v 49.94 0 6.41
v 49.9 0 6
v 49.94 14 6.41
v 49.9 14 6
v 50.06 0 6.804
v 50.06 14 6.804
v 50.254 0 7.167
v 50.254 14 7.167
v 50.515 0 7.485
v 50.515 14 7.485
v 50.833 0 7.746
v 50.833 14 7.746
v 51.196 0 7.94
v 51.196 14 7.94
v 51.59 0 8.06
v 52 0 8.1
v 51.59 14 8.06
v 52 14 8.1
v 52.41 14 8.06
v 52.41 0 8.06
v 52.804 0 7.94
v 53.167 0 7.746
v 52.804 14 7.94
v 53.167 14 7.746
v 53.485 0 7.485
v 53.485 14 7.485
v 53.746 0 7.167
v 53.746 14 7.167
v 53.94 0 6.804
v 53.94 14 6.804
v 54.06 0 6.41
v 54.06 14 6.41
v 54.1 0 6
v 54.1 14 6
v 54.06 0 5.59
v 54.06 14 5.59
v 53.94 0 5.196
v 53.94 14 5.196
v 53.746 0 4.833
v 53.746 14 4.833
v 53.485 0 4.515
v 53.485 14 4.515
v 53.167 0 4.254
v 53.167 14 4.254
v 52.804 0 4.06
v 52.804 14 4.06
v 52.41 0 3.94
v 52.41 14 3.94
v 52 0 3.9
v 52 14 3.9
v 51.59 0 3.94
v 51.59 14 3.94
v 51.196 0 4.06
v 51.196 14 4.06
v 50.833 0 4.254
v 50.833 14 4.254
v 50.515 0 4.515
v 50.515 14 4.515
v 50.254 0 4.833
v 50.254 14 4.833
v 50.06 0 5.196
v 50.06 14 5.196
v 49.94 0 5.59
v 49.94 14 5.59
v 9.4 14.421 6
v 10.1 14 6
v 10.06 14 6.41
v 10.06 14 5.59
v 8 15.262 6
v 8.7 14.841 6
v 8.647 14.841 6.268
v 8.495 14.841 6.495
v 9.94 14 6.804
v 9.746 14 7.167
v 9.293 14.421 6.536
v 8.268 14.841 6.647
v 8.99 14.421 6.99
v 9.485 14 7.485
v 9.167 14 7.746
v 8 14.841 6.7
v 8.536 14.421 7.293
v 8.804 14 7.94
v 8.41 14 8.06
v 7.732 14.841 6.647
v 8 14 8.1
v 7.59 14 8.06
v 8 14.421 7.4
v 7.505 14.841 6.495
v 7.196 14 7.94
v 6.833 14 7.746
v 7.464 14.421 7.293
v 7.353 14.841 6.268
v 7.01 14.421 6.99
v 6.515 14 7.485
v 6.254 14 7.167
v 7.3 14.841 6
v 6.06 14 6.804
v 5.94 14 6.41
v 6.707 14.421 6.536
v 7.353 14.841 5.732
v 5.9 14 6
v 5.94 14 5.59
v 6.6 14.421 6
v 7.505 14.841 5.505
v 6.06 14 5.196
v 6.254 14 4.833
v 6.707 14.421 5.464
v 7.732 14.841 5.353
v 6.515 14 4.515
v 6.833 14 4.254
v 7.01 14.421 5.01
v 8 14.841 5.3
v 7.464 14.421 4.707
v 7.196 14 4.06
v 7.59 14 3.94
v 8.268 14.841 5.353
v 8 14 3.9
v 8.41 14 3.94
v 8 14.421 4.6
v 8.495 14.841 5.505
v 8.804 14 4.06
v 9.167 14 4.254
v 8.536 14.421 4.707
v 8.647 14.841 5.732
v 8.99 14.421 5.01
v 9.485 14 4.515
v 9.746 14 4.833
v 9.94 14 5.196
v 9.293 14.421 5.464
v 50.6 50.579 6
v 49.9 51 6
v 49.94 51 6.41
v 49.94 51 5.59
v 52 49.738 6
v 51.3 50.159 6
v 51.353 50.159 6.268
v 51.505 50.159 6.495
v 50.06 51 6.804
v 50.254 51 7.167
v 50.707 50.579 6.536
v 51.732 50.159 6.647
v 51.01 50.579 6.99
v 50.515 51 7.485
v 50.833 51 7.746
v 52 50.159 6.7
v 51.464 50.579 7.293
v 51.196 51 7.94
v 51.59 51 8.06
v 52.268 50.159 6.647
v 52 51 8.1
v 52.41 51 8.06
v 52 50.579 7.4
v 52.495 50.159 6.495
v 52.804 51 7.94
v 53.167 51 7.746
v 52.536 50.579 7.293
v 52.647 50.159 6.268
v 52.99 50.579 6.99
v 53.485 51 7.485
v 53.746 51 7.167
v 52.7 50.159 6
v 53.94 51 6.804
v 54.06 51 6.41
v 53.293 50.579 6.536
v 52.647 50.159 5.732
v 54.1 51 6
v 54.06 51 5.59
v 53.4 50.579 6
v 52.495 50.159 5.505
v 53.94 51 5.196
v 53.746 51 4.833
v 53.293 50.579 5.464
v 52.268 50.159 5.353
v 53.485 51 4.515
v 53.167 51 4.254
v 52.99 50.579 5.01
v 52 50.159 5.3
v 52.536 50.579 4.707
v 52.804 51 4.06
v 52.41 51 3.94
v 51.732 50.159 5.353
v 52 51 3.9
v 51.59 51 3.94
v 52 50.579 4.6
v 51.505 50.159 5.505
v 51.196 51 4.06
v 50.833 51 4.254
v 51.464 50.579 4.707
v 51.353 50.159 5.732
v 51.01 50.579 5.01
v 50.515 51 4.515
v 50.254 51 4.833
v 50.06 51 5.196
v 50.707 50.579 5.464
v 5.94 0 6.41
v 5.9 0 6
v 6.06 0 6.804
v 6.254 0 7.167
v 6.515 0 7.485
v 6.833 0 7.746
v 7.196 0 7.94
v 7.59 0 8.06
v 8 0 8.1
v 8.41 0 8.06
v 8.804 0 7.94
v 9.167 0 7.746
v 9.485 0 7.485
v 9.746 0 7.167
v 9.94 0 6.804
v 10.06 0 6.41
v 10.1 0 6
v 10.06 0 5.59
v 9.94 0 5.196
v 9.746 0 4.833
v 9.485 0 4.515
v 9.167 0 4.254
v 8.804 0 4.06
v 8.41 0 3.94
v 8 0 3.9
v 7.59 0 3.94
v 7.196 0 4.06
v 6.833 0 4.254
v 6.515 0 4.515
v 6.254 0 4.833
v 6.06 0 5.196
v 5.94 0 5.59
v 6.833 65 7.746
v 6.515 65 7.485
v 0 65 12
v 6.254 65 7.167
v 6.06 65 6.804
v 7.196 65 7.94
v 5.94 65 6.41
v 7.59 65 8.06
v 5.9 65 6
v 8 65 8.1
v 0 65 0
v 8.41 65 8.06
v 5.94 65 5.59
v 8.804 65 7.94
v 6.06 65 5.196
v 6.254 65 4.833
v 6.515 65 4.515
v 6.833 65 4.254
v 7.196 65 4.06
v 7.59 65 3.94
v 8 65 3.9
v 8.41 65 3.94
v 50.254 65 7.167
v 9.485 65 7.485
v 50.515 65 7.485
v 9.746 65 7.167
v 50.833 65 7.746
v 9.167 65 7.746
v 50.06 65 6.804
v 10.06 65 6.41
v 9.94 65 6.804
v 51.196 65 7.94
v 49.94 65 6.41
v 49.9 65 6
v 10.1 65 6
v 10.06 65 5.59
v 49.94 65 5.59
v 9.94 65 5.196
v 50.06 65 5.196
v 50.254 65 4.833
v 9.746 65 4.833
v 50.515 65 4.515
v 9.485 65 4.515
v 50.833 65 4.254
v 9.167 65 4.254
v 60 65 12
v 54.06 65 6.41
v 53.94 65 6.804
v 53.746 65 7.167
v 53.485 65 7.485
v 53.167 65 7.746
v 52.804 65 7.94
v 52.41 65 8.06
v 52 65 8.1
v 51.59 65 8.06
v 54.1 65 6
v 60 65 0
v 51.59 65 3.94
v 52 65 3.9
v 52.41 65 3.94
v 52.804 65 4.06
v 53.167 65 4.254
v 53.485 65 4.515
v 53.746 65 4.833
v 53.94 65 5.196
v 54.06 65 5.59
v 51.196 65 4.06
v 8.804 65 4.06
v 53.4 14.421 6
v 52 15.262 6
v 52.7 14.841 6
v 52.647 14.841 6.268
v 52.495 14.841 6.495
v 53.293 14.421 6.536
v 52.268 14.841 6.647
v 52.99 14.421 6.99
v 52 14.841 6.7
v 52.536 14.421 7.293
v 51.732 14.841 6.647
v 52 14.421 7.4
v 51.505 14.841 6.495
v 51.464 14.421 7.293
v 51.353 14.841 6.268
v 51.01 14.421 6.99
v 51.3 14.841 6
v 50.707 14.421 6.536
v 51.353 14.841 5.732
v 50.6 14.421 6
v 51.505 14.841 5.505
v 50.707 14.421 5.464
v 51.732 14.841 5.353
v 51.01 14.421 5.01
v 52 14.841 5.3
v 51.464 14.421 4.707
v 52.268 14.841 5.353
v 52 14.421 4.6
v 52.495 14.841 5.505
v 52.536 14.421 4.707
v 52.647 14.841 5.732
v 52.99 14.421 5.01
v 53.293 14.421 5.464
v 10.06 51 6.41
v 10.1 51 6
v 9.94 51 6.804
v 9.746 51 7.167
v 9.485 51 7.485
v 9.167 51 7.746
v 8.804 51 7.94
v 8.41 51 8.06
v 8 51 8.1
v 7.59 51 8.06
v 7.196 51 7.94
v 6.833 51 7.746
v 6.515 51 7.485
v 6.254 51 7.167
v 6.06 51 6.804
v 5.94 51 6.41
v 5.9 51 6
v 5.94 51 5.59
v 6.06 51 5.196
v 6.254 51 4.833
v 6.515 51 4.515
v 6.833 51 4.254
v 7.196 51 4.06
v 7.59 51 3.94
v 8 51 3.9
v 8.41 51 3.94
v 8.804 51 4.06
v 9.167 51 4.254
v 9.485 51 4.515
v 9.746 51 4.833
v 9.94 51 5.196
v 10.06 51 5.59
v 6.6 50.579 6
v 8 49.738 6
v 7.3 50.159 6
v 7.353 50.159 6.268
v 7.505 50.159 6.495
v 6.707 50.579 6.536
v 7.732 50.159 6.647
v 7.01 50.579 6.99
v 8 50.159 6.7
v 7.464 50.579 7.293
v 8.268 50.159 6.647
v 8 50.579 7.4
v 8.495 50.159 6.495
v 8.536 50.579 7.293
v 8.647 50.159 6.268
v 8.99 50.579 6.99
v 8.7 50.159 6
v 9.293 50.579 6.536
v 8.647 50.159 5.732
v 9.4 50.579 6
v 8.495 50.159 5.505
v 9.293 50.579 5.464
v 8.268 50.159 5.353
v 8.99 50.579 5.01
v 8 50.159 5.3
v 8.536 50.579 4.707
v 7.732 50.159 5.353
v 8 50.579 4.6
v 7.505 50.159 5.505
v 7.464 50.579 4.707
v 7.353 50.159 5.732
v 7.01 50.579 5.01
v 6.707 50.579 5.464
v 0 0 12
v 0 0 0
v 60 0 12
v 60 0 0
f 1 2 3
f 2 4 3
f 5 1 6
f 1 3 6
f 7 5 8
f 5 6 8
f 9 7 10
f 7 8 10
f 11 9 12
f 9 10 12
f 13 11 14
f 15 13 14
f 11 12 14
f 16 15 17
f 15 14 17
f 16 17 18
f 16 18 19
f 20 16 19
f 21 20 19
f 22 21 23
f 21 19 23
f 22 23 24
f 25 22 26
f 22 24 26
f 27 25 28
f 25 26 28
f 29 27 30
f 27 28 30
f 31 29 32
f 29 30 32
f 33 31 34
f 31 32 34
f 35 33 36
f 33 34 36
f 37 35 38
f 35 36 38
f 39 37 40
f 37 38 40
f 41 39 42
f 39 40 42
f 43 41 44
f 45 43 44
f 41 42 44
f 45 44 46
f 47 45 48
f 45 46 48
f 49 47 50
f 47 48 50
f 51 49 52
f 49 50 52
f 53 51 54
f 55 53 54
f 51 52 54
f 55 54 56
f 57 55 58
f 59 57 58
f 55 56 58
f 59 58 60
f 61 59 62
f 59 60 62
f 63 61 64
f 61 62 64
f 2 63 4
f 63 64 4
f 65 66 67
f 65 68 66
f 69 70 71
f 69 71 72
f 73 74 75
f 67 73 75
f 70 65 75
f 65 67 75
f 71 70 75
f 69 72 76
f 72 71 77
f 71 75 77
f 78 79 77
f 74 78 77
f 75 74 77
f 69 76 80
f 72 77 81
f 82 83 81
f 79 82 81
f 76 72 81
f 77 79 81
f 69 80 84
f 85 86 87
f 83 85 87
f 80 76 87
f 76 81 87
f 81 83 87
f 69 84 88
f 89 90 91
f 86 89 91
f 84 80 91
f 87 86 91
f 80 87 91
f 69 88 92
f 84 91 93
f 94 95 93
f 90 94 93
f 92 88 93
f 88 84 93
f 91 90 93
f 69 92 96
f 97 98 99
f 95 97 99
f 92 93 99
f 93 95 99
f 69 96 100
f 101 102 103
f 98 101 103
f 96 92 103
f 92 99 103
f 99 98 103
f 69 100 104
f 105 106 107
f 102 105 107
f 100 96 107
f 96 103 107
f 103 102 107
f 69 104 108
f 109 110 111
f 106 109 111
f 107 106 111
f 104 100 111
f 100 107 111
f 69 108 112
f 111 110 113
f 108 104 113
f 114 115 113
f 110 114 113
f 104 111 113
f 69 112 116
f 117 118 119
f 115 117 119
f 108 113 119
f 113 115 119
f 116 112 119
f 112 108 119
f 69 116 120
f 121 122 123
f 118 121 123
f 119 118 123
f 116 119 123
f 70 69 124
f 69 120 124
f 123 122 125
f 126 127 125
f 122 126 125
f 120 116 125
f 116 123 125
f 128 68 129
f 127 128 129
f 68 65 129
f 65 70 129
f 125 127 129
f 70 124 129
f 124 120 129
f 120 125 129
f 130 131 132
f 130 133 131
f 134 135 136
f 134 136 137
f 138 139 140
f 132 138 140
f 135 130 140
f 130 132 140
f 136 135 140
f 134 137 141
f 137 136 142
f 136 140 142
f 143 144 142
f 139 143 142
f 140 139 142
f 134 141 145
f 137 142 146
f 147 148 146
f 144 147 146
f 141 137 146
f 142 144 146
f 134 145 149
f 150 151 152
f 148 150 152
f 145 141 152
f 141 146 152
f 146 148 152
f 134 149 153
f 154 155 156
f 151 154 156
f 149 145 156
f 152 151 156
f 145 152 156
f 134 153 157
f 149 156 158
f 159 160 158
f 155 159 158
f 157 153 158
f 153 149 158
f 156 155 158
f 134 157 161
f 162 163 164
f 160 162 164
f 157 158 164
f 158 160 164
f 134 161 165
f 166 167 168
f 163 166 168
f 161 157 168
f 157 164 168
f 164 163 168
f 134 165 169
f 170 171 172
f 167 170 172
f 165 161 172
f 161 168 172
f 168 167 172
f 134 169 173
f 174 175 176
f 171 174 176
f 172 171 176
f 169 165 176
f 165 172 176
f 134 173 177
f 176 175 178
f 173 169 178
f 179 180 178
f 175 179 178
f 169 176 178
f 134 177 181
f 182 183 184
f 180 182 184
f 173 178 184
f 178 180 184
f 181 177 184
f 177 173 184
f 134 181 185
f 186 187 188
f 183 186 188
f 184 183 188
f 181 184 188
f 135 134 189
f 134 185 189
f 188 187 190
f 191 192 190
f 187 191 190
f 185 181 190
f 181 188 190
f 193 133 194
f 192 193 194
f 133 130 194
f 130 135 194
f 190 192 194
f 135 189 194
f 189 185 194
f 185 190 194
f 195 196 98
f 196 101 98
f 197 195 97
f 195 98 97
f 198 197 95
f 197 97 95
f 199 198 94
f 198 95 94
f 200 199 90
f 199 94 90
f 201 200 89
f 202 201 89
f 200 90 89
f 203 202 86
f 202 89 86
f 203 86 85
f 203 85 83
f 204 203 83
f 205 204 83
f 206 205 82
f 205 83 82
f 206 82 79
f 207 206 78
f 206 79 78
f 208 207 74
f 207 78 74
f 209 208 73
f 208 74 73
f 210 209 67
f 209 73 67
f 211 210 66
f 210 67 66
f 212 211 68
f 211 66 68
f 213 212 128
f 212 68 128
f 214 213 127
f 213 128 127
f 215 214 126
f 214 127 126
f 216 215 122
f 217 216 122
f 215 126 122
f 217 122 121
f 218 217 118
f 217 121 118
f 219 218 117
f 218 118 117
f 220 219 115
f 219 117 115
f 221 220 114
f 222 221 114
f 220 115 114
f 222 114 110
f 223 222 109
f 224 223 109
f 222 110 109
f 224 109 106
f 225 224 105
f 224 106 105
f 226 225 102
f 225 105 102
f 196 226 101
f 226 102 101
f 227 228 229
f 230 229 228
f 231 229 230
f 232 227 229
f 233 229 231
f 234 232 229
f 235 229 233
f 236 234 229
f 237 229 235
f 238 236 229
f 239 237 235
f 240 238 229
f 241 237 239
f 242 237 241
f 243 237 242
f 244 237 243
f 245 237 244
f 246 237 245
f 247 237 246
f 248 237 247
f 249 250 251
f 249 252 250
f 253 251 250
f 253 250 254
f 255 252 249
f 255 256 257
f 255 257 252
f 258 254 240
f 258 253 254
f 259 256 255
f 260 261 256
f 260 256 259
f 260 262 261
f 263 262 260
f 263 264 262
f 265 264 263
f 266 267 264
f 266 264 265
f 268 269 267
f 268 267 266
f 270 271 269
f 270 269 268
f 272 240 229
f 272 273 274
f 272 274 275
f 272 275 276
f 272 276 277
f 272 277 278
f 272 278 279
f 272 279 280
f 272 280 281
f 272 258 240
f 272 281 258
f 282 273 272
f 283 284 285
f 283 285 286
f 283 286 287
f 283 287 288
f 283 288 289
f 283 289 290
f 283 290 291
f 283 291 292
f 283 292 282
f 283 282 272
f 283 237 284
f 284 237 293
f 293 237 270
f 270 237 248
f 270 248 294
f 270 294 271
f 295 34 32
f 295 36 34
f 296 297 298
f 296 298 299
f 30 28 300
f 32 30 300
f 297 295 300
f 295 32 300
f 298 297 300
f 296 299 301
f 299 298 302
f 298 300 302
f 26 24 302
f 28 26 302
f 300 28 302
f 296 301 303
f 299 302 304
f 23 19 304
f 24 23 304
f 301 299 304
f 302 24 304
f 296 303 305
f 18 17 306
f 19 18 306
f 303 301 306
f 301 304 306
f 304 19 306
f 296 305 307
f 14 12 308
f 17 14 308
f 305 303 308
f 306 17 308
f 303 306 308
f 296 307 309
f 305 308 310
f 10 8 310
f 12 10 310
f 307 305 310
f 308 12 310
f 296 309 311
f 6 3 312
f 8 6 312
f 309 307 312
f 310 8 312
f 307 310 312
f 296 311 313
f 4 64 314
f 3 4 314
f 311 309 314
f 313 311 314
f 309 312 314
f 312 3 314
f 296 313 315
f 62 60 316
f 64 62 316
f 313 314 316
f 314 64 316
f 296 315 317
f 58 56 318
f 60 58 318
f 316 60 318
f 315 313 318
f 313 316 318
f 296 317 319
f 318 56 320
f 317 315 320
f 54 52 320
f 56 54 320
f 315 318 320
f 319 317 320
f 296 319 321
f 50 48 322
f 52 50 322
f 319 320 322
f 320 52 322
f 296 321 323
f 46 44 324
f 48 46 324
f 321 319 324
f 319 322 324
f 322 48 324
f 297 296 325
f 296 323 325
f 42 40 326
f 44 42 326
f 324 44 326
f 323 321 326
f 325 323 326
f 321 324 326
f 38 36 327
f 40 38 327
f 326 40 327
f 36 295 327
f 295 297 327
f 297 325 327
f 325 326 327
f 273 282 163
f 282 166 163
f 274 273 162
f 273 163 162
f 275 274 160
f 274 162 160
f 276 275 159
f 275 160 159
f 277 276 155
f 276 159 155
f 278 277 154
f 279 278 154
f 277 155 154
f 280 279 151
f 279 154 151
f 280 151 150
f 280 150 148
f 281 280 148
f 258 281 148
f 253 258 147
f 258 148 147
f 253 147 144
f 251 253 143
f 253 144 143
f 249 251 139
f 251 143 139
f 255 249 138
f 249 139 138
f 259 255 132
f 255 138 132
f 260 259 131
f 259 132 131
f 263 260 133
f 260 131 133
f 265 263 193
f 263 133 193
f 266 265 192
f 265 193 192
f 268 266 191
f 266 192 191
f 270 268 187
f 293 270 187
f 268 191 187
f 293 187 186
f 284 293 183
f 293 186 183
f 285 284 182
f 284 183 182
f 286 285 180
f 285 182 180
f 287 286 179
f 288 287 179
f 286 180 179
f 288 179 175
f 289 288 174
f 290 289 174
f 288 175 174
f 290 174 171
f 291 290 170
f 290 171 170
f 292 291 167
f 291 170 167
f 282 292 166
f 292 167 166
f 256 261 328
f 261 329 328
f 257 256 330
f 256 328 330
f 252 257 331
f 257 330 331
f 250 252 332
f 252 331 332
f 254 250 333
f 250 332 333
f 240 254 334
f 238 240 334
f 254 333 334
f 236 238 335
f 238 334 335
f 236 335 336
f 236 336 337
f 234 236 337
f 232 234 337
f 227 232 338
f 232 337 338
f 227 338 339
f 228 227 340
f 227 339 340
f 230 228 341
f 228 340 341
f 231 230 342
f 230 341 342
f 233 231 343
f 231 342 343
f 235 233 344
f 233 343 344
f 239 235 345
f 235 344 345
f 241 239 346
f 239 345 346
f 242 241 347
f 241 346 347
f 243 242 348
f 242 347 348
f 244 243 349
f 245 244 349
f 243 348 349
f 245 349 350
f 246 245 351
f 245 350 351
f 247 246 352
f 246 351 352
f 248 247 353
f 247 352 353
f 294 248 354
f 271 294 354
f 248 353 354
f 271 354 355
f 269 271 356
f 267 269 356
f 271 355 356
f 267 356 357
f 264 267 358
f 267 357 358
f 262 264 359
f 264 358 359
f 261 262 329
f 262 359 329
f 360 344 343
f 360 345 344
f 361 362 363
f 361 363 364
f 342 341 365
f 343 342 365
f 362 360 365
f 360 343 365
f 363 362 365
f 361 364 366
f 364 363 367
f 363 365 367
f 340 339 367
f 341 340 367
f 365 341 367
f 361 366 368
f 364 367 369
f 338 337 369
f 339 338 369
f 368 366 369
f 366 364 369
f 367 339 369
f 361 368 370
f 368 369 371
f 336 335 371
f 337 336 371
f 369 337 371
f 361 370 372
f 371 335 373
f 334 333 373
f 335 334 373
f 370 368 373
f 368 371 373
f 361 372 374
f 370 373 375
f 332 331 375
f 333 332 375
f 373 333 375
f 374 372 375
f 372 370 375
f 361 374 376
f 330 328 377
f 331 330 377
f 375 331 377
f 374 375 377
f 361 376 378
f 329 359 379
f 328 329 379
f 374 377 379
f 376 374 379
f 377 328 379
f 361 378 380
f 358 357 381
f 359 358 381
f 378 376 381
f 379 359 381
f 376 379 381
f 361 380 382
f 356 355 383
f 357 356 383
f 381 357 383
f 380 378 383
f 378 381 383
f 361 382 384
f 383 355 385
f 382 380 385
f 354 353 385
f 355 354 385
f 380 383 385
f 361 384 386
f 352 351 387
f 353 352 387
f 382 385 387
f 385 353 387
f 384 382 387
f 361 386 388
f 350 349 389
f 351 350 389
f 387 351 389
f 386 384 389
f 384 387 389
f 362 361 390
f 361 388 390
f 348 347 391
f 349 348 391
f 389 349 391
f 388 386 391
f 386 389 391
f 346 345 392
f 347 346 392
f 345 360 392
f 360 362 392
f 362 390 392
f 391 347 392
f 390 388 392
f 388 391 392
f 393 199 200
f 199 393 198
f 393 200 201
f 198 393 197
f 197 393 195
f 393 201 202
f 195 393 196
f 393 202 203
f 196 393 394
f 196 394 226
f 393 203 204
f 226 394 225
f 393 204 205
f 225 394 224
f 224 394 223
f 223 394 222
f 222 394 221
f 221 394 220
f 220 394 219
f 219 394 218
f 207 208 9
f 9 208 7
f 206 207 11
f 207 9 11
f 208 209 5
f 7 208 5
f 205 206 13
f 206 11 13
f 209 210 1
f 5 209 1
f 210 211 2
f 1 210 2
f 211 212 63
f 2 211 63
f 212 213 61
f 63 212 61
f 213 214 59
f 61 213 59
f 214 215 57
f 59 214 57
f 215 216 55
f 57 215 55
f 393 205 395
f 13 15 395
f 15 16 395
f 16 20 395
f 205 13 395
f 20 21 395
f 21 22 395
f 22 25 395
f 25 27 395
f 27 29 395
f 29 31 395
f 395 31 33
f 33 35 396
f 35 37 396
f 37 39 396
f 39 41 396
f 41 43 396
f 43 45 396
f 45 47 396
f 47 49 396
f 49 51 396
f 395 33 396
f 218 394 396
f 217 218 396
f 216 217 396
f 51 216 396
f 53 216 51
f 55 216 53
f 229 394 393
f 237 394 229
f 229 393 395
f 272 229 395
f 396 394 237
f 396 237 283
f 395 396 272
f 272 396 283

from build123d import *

# Parameters (mm, degrees)
ESQUISSE1_W           = 60
ESQUISSE1_H           = 65
BOSS_EXTRU_1_DEPTH    = 12
TROU_TARAUD_M57_D     = 4.2
TROU_TARAUD_M57_DEPTH = 14
TROU_TARAUD_M57_TIP   = 1.2618073
TROU_TARAUD_M58_D     = 4.2
TROU_TARAUD_M58_DEPTH = 14
TROU_TARAUD_M58_TIP   = 1.2618073
TROU_TARAUD_M56_D     = 4.2
TROU_TARAUD_M56_DEPTH = 14
TROU_TARAUD_M56_TIP   = 1.2618073
TROU_TARAUD_M55_D     = 4.2
TROU_TARAUD_M55_DEPTH = 14
TROU_TARAUD_M55_TIP   = 1.2618073


with BuildPart() as part:
    # Esquisse1 → Boss.-Extru.1 (new body)
    with BuildSketch(Plane.XY):
        with Locations((30, 32.5)):
            Rectangle(ESQUISSE1_W, ESQUISSE1_H)
    extrude(amount=BOSS_EXTRU_1_DEPTH)

    # Trou taraudé M57
    with Locations(Plane(origin=(0, 65, 0), x_dir=(-1, 0, 0), z_dir=(0, 1, 0))):
        with Locations((-8, 6)):
            Hole(TROU_TARAUD_M57_D / 2, depth=TROU_TARAUD_M57_DEPTH)
            with Locations((0, 0, -(TROU_TARAUD_M57_DEPTH + TROU_TARAUD_M57_TIP / 2))):  # 118° drill point
                Cone(0, TROU_TARAUD_M57_D / 2, TROU_TARAUD_M57_TIP, mode=Mode.SUBTRACT)

    # Trou taraudé M58
    with Locations(Plane(origin=(0, 65, 0), x_dir=(-1, 0, 0), z_dir=(0, 1, 0))):
        with Locations((-52, 6)):
            Hole(TROU_TARAUD_M58_D / 2, depth=TROU_TARAUD_M58_DEPTH)
            with Locations((0, 0, -(TROU_TARAUD_M58_DEPTH + TROU_TARAUD_M58_TIP / 2))):  # 118° drill point
                Cone(0, TROU_TARAUD_M58_D / 2, TROU_TARAUD_M58_TIP, mode=Mode.SUBTRACT)

    # Trou taraudé M56
    with Locations(Plane.XZ):
        with Locations((8, 6)):
            Hole(TROU_TARAUD_M56_D / 2, depth=TROU_TARAUD_M56_DEPTH)
            with Locations((0, 0, -(TROU_TARAUD_M56_DEPTH + TROU_TARAUD_M56_TIP / 2))):  # 118° drill point
                Cone(0, TROU_TARAUD_M56_D / 2, TROU_TARAUD_M56_TIP, mode=Mode.SUBTRACT)

    # Trou taraudé M55
    with Locations(Plane.XZ):
        with Locations((52, 6)):
            Hole(TROU_TARAUD_M55_D / 2, depth=TROU_TARAUD_M55_DEPTH)
            with Locations((0, 0, -(TROU_TARAUD_M55_DEPTH + TROU_TARAUD_M55_TIP / 2))):  # 118° drill point
                Cone(0, TROU_TARAUD_M55_D / 2, TROU_TARAUD_M55_TIP, mode=Mode.SUBTRACT)


solid = part.part
